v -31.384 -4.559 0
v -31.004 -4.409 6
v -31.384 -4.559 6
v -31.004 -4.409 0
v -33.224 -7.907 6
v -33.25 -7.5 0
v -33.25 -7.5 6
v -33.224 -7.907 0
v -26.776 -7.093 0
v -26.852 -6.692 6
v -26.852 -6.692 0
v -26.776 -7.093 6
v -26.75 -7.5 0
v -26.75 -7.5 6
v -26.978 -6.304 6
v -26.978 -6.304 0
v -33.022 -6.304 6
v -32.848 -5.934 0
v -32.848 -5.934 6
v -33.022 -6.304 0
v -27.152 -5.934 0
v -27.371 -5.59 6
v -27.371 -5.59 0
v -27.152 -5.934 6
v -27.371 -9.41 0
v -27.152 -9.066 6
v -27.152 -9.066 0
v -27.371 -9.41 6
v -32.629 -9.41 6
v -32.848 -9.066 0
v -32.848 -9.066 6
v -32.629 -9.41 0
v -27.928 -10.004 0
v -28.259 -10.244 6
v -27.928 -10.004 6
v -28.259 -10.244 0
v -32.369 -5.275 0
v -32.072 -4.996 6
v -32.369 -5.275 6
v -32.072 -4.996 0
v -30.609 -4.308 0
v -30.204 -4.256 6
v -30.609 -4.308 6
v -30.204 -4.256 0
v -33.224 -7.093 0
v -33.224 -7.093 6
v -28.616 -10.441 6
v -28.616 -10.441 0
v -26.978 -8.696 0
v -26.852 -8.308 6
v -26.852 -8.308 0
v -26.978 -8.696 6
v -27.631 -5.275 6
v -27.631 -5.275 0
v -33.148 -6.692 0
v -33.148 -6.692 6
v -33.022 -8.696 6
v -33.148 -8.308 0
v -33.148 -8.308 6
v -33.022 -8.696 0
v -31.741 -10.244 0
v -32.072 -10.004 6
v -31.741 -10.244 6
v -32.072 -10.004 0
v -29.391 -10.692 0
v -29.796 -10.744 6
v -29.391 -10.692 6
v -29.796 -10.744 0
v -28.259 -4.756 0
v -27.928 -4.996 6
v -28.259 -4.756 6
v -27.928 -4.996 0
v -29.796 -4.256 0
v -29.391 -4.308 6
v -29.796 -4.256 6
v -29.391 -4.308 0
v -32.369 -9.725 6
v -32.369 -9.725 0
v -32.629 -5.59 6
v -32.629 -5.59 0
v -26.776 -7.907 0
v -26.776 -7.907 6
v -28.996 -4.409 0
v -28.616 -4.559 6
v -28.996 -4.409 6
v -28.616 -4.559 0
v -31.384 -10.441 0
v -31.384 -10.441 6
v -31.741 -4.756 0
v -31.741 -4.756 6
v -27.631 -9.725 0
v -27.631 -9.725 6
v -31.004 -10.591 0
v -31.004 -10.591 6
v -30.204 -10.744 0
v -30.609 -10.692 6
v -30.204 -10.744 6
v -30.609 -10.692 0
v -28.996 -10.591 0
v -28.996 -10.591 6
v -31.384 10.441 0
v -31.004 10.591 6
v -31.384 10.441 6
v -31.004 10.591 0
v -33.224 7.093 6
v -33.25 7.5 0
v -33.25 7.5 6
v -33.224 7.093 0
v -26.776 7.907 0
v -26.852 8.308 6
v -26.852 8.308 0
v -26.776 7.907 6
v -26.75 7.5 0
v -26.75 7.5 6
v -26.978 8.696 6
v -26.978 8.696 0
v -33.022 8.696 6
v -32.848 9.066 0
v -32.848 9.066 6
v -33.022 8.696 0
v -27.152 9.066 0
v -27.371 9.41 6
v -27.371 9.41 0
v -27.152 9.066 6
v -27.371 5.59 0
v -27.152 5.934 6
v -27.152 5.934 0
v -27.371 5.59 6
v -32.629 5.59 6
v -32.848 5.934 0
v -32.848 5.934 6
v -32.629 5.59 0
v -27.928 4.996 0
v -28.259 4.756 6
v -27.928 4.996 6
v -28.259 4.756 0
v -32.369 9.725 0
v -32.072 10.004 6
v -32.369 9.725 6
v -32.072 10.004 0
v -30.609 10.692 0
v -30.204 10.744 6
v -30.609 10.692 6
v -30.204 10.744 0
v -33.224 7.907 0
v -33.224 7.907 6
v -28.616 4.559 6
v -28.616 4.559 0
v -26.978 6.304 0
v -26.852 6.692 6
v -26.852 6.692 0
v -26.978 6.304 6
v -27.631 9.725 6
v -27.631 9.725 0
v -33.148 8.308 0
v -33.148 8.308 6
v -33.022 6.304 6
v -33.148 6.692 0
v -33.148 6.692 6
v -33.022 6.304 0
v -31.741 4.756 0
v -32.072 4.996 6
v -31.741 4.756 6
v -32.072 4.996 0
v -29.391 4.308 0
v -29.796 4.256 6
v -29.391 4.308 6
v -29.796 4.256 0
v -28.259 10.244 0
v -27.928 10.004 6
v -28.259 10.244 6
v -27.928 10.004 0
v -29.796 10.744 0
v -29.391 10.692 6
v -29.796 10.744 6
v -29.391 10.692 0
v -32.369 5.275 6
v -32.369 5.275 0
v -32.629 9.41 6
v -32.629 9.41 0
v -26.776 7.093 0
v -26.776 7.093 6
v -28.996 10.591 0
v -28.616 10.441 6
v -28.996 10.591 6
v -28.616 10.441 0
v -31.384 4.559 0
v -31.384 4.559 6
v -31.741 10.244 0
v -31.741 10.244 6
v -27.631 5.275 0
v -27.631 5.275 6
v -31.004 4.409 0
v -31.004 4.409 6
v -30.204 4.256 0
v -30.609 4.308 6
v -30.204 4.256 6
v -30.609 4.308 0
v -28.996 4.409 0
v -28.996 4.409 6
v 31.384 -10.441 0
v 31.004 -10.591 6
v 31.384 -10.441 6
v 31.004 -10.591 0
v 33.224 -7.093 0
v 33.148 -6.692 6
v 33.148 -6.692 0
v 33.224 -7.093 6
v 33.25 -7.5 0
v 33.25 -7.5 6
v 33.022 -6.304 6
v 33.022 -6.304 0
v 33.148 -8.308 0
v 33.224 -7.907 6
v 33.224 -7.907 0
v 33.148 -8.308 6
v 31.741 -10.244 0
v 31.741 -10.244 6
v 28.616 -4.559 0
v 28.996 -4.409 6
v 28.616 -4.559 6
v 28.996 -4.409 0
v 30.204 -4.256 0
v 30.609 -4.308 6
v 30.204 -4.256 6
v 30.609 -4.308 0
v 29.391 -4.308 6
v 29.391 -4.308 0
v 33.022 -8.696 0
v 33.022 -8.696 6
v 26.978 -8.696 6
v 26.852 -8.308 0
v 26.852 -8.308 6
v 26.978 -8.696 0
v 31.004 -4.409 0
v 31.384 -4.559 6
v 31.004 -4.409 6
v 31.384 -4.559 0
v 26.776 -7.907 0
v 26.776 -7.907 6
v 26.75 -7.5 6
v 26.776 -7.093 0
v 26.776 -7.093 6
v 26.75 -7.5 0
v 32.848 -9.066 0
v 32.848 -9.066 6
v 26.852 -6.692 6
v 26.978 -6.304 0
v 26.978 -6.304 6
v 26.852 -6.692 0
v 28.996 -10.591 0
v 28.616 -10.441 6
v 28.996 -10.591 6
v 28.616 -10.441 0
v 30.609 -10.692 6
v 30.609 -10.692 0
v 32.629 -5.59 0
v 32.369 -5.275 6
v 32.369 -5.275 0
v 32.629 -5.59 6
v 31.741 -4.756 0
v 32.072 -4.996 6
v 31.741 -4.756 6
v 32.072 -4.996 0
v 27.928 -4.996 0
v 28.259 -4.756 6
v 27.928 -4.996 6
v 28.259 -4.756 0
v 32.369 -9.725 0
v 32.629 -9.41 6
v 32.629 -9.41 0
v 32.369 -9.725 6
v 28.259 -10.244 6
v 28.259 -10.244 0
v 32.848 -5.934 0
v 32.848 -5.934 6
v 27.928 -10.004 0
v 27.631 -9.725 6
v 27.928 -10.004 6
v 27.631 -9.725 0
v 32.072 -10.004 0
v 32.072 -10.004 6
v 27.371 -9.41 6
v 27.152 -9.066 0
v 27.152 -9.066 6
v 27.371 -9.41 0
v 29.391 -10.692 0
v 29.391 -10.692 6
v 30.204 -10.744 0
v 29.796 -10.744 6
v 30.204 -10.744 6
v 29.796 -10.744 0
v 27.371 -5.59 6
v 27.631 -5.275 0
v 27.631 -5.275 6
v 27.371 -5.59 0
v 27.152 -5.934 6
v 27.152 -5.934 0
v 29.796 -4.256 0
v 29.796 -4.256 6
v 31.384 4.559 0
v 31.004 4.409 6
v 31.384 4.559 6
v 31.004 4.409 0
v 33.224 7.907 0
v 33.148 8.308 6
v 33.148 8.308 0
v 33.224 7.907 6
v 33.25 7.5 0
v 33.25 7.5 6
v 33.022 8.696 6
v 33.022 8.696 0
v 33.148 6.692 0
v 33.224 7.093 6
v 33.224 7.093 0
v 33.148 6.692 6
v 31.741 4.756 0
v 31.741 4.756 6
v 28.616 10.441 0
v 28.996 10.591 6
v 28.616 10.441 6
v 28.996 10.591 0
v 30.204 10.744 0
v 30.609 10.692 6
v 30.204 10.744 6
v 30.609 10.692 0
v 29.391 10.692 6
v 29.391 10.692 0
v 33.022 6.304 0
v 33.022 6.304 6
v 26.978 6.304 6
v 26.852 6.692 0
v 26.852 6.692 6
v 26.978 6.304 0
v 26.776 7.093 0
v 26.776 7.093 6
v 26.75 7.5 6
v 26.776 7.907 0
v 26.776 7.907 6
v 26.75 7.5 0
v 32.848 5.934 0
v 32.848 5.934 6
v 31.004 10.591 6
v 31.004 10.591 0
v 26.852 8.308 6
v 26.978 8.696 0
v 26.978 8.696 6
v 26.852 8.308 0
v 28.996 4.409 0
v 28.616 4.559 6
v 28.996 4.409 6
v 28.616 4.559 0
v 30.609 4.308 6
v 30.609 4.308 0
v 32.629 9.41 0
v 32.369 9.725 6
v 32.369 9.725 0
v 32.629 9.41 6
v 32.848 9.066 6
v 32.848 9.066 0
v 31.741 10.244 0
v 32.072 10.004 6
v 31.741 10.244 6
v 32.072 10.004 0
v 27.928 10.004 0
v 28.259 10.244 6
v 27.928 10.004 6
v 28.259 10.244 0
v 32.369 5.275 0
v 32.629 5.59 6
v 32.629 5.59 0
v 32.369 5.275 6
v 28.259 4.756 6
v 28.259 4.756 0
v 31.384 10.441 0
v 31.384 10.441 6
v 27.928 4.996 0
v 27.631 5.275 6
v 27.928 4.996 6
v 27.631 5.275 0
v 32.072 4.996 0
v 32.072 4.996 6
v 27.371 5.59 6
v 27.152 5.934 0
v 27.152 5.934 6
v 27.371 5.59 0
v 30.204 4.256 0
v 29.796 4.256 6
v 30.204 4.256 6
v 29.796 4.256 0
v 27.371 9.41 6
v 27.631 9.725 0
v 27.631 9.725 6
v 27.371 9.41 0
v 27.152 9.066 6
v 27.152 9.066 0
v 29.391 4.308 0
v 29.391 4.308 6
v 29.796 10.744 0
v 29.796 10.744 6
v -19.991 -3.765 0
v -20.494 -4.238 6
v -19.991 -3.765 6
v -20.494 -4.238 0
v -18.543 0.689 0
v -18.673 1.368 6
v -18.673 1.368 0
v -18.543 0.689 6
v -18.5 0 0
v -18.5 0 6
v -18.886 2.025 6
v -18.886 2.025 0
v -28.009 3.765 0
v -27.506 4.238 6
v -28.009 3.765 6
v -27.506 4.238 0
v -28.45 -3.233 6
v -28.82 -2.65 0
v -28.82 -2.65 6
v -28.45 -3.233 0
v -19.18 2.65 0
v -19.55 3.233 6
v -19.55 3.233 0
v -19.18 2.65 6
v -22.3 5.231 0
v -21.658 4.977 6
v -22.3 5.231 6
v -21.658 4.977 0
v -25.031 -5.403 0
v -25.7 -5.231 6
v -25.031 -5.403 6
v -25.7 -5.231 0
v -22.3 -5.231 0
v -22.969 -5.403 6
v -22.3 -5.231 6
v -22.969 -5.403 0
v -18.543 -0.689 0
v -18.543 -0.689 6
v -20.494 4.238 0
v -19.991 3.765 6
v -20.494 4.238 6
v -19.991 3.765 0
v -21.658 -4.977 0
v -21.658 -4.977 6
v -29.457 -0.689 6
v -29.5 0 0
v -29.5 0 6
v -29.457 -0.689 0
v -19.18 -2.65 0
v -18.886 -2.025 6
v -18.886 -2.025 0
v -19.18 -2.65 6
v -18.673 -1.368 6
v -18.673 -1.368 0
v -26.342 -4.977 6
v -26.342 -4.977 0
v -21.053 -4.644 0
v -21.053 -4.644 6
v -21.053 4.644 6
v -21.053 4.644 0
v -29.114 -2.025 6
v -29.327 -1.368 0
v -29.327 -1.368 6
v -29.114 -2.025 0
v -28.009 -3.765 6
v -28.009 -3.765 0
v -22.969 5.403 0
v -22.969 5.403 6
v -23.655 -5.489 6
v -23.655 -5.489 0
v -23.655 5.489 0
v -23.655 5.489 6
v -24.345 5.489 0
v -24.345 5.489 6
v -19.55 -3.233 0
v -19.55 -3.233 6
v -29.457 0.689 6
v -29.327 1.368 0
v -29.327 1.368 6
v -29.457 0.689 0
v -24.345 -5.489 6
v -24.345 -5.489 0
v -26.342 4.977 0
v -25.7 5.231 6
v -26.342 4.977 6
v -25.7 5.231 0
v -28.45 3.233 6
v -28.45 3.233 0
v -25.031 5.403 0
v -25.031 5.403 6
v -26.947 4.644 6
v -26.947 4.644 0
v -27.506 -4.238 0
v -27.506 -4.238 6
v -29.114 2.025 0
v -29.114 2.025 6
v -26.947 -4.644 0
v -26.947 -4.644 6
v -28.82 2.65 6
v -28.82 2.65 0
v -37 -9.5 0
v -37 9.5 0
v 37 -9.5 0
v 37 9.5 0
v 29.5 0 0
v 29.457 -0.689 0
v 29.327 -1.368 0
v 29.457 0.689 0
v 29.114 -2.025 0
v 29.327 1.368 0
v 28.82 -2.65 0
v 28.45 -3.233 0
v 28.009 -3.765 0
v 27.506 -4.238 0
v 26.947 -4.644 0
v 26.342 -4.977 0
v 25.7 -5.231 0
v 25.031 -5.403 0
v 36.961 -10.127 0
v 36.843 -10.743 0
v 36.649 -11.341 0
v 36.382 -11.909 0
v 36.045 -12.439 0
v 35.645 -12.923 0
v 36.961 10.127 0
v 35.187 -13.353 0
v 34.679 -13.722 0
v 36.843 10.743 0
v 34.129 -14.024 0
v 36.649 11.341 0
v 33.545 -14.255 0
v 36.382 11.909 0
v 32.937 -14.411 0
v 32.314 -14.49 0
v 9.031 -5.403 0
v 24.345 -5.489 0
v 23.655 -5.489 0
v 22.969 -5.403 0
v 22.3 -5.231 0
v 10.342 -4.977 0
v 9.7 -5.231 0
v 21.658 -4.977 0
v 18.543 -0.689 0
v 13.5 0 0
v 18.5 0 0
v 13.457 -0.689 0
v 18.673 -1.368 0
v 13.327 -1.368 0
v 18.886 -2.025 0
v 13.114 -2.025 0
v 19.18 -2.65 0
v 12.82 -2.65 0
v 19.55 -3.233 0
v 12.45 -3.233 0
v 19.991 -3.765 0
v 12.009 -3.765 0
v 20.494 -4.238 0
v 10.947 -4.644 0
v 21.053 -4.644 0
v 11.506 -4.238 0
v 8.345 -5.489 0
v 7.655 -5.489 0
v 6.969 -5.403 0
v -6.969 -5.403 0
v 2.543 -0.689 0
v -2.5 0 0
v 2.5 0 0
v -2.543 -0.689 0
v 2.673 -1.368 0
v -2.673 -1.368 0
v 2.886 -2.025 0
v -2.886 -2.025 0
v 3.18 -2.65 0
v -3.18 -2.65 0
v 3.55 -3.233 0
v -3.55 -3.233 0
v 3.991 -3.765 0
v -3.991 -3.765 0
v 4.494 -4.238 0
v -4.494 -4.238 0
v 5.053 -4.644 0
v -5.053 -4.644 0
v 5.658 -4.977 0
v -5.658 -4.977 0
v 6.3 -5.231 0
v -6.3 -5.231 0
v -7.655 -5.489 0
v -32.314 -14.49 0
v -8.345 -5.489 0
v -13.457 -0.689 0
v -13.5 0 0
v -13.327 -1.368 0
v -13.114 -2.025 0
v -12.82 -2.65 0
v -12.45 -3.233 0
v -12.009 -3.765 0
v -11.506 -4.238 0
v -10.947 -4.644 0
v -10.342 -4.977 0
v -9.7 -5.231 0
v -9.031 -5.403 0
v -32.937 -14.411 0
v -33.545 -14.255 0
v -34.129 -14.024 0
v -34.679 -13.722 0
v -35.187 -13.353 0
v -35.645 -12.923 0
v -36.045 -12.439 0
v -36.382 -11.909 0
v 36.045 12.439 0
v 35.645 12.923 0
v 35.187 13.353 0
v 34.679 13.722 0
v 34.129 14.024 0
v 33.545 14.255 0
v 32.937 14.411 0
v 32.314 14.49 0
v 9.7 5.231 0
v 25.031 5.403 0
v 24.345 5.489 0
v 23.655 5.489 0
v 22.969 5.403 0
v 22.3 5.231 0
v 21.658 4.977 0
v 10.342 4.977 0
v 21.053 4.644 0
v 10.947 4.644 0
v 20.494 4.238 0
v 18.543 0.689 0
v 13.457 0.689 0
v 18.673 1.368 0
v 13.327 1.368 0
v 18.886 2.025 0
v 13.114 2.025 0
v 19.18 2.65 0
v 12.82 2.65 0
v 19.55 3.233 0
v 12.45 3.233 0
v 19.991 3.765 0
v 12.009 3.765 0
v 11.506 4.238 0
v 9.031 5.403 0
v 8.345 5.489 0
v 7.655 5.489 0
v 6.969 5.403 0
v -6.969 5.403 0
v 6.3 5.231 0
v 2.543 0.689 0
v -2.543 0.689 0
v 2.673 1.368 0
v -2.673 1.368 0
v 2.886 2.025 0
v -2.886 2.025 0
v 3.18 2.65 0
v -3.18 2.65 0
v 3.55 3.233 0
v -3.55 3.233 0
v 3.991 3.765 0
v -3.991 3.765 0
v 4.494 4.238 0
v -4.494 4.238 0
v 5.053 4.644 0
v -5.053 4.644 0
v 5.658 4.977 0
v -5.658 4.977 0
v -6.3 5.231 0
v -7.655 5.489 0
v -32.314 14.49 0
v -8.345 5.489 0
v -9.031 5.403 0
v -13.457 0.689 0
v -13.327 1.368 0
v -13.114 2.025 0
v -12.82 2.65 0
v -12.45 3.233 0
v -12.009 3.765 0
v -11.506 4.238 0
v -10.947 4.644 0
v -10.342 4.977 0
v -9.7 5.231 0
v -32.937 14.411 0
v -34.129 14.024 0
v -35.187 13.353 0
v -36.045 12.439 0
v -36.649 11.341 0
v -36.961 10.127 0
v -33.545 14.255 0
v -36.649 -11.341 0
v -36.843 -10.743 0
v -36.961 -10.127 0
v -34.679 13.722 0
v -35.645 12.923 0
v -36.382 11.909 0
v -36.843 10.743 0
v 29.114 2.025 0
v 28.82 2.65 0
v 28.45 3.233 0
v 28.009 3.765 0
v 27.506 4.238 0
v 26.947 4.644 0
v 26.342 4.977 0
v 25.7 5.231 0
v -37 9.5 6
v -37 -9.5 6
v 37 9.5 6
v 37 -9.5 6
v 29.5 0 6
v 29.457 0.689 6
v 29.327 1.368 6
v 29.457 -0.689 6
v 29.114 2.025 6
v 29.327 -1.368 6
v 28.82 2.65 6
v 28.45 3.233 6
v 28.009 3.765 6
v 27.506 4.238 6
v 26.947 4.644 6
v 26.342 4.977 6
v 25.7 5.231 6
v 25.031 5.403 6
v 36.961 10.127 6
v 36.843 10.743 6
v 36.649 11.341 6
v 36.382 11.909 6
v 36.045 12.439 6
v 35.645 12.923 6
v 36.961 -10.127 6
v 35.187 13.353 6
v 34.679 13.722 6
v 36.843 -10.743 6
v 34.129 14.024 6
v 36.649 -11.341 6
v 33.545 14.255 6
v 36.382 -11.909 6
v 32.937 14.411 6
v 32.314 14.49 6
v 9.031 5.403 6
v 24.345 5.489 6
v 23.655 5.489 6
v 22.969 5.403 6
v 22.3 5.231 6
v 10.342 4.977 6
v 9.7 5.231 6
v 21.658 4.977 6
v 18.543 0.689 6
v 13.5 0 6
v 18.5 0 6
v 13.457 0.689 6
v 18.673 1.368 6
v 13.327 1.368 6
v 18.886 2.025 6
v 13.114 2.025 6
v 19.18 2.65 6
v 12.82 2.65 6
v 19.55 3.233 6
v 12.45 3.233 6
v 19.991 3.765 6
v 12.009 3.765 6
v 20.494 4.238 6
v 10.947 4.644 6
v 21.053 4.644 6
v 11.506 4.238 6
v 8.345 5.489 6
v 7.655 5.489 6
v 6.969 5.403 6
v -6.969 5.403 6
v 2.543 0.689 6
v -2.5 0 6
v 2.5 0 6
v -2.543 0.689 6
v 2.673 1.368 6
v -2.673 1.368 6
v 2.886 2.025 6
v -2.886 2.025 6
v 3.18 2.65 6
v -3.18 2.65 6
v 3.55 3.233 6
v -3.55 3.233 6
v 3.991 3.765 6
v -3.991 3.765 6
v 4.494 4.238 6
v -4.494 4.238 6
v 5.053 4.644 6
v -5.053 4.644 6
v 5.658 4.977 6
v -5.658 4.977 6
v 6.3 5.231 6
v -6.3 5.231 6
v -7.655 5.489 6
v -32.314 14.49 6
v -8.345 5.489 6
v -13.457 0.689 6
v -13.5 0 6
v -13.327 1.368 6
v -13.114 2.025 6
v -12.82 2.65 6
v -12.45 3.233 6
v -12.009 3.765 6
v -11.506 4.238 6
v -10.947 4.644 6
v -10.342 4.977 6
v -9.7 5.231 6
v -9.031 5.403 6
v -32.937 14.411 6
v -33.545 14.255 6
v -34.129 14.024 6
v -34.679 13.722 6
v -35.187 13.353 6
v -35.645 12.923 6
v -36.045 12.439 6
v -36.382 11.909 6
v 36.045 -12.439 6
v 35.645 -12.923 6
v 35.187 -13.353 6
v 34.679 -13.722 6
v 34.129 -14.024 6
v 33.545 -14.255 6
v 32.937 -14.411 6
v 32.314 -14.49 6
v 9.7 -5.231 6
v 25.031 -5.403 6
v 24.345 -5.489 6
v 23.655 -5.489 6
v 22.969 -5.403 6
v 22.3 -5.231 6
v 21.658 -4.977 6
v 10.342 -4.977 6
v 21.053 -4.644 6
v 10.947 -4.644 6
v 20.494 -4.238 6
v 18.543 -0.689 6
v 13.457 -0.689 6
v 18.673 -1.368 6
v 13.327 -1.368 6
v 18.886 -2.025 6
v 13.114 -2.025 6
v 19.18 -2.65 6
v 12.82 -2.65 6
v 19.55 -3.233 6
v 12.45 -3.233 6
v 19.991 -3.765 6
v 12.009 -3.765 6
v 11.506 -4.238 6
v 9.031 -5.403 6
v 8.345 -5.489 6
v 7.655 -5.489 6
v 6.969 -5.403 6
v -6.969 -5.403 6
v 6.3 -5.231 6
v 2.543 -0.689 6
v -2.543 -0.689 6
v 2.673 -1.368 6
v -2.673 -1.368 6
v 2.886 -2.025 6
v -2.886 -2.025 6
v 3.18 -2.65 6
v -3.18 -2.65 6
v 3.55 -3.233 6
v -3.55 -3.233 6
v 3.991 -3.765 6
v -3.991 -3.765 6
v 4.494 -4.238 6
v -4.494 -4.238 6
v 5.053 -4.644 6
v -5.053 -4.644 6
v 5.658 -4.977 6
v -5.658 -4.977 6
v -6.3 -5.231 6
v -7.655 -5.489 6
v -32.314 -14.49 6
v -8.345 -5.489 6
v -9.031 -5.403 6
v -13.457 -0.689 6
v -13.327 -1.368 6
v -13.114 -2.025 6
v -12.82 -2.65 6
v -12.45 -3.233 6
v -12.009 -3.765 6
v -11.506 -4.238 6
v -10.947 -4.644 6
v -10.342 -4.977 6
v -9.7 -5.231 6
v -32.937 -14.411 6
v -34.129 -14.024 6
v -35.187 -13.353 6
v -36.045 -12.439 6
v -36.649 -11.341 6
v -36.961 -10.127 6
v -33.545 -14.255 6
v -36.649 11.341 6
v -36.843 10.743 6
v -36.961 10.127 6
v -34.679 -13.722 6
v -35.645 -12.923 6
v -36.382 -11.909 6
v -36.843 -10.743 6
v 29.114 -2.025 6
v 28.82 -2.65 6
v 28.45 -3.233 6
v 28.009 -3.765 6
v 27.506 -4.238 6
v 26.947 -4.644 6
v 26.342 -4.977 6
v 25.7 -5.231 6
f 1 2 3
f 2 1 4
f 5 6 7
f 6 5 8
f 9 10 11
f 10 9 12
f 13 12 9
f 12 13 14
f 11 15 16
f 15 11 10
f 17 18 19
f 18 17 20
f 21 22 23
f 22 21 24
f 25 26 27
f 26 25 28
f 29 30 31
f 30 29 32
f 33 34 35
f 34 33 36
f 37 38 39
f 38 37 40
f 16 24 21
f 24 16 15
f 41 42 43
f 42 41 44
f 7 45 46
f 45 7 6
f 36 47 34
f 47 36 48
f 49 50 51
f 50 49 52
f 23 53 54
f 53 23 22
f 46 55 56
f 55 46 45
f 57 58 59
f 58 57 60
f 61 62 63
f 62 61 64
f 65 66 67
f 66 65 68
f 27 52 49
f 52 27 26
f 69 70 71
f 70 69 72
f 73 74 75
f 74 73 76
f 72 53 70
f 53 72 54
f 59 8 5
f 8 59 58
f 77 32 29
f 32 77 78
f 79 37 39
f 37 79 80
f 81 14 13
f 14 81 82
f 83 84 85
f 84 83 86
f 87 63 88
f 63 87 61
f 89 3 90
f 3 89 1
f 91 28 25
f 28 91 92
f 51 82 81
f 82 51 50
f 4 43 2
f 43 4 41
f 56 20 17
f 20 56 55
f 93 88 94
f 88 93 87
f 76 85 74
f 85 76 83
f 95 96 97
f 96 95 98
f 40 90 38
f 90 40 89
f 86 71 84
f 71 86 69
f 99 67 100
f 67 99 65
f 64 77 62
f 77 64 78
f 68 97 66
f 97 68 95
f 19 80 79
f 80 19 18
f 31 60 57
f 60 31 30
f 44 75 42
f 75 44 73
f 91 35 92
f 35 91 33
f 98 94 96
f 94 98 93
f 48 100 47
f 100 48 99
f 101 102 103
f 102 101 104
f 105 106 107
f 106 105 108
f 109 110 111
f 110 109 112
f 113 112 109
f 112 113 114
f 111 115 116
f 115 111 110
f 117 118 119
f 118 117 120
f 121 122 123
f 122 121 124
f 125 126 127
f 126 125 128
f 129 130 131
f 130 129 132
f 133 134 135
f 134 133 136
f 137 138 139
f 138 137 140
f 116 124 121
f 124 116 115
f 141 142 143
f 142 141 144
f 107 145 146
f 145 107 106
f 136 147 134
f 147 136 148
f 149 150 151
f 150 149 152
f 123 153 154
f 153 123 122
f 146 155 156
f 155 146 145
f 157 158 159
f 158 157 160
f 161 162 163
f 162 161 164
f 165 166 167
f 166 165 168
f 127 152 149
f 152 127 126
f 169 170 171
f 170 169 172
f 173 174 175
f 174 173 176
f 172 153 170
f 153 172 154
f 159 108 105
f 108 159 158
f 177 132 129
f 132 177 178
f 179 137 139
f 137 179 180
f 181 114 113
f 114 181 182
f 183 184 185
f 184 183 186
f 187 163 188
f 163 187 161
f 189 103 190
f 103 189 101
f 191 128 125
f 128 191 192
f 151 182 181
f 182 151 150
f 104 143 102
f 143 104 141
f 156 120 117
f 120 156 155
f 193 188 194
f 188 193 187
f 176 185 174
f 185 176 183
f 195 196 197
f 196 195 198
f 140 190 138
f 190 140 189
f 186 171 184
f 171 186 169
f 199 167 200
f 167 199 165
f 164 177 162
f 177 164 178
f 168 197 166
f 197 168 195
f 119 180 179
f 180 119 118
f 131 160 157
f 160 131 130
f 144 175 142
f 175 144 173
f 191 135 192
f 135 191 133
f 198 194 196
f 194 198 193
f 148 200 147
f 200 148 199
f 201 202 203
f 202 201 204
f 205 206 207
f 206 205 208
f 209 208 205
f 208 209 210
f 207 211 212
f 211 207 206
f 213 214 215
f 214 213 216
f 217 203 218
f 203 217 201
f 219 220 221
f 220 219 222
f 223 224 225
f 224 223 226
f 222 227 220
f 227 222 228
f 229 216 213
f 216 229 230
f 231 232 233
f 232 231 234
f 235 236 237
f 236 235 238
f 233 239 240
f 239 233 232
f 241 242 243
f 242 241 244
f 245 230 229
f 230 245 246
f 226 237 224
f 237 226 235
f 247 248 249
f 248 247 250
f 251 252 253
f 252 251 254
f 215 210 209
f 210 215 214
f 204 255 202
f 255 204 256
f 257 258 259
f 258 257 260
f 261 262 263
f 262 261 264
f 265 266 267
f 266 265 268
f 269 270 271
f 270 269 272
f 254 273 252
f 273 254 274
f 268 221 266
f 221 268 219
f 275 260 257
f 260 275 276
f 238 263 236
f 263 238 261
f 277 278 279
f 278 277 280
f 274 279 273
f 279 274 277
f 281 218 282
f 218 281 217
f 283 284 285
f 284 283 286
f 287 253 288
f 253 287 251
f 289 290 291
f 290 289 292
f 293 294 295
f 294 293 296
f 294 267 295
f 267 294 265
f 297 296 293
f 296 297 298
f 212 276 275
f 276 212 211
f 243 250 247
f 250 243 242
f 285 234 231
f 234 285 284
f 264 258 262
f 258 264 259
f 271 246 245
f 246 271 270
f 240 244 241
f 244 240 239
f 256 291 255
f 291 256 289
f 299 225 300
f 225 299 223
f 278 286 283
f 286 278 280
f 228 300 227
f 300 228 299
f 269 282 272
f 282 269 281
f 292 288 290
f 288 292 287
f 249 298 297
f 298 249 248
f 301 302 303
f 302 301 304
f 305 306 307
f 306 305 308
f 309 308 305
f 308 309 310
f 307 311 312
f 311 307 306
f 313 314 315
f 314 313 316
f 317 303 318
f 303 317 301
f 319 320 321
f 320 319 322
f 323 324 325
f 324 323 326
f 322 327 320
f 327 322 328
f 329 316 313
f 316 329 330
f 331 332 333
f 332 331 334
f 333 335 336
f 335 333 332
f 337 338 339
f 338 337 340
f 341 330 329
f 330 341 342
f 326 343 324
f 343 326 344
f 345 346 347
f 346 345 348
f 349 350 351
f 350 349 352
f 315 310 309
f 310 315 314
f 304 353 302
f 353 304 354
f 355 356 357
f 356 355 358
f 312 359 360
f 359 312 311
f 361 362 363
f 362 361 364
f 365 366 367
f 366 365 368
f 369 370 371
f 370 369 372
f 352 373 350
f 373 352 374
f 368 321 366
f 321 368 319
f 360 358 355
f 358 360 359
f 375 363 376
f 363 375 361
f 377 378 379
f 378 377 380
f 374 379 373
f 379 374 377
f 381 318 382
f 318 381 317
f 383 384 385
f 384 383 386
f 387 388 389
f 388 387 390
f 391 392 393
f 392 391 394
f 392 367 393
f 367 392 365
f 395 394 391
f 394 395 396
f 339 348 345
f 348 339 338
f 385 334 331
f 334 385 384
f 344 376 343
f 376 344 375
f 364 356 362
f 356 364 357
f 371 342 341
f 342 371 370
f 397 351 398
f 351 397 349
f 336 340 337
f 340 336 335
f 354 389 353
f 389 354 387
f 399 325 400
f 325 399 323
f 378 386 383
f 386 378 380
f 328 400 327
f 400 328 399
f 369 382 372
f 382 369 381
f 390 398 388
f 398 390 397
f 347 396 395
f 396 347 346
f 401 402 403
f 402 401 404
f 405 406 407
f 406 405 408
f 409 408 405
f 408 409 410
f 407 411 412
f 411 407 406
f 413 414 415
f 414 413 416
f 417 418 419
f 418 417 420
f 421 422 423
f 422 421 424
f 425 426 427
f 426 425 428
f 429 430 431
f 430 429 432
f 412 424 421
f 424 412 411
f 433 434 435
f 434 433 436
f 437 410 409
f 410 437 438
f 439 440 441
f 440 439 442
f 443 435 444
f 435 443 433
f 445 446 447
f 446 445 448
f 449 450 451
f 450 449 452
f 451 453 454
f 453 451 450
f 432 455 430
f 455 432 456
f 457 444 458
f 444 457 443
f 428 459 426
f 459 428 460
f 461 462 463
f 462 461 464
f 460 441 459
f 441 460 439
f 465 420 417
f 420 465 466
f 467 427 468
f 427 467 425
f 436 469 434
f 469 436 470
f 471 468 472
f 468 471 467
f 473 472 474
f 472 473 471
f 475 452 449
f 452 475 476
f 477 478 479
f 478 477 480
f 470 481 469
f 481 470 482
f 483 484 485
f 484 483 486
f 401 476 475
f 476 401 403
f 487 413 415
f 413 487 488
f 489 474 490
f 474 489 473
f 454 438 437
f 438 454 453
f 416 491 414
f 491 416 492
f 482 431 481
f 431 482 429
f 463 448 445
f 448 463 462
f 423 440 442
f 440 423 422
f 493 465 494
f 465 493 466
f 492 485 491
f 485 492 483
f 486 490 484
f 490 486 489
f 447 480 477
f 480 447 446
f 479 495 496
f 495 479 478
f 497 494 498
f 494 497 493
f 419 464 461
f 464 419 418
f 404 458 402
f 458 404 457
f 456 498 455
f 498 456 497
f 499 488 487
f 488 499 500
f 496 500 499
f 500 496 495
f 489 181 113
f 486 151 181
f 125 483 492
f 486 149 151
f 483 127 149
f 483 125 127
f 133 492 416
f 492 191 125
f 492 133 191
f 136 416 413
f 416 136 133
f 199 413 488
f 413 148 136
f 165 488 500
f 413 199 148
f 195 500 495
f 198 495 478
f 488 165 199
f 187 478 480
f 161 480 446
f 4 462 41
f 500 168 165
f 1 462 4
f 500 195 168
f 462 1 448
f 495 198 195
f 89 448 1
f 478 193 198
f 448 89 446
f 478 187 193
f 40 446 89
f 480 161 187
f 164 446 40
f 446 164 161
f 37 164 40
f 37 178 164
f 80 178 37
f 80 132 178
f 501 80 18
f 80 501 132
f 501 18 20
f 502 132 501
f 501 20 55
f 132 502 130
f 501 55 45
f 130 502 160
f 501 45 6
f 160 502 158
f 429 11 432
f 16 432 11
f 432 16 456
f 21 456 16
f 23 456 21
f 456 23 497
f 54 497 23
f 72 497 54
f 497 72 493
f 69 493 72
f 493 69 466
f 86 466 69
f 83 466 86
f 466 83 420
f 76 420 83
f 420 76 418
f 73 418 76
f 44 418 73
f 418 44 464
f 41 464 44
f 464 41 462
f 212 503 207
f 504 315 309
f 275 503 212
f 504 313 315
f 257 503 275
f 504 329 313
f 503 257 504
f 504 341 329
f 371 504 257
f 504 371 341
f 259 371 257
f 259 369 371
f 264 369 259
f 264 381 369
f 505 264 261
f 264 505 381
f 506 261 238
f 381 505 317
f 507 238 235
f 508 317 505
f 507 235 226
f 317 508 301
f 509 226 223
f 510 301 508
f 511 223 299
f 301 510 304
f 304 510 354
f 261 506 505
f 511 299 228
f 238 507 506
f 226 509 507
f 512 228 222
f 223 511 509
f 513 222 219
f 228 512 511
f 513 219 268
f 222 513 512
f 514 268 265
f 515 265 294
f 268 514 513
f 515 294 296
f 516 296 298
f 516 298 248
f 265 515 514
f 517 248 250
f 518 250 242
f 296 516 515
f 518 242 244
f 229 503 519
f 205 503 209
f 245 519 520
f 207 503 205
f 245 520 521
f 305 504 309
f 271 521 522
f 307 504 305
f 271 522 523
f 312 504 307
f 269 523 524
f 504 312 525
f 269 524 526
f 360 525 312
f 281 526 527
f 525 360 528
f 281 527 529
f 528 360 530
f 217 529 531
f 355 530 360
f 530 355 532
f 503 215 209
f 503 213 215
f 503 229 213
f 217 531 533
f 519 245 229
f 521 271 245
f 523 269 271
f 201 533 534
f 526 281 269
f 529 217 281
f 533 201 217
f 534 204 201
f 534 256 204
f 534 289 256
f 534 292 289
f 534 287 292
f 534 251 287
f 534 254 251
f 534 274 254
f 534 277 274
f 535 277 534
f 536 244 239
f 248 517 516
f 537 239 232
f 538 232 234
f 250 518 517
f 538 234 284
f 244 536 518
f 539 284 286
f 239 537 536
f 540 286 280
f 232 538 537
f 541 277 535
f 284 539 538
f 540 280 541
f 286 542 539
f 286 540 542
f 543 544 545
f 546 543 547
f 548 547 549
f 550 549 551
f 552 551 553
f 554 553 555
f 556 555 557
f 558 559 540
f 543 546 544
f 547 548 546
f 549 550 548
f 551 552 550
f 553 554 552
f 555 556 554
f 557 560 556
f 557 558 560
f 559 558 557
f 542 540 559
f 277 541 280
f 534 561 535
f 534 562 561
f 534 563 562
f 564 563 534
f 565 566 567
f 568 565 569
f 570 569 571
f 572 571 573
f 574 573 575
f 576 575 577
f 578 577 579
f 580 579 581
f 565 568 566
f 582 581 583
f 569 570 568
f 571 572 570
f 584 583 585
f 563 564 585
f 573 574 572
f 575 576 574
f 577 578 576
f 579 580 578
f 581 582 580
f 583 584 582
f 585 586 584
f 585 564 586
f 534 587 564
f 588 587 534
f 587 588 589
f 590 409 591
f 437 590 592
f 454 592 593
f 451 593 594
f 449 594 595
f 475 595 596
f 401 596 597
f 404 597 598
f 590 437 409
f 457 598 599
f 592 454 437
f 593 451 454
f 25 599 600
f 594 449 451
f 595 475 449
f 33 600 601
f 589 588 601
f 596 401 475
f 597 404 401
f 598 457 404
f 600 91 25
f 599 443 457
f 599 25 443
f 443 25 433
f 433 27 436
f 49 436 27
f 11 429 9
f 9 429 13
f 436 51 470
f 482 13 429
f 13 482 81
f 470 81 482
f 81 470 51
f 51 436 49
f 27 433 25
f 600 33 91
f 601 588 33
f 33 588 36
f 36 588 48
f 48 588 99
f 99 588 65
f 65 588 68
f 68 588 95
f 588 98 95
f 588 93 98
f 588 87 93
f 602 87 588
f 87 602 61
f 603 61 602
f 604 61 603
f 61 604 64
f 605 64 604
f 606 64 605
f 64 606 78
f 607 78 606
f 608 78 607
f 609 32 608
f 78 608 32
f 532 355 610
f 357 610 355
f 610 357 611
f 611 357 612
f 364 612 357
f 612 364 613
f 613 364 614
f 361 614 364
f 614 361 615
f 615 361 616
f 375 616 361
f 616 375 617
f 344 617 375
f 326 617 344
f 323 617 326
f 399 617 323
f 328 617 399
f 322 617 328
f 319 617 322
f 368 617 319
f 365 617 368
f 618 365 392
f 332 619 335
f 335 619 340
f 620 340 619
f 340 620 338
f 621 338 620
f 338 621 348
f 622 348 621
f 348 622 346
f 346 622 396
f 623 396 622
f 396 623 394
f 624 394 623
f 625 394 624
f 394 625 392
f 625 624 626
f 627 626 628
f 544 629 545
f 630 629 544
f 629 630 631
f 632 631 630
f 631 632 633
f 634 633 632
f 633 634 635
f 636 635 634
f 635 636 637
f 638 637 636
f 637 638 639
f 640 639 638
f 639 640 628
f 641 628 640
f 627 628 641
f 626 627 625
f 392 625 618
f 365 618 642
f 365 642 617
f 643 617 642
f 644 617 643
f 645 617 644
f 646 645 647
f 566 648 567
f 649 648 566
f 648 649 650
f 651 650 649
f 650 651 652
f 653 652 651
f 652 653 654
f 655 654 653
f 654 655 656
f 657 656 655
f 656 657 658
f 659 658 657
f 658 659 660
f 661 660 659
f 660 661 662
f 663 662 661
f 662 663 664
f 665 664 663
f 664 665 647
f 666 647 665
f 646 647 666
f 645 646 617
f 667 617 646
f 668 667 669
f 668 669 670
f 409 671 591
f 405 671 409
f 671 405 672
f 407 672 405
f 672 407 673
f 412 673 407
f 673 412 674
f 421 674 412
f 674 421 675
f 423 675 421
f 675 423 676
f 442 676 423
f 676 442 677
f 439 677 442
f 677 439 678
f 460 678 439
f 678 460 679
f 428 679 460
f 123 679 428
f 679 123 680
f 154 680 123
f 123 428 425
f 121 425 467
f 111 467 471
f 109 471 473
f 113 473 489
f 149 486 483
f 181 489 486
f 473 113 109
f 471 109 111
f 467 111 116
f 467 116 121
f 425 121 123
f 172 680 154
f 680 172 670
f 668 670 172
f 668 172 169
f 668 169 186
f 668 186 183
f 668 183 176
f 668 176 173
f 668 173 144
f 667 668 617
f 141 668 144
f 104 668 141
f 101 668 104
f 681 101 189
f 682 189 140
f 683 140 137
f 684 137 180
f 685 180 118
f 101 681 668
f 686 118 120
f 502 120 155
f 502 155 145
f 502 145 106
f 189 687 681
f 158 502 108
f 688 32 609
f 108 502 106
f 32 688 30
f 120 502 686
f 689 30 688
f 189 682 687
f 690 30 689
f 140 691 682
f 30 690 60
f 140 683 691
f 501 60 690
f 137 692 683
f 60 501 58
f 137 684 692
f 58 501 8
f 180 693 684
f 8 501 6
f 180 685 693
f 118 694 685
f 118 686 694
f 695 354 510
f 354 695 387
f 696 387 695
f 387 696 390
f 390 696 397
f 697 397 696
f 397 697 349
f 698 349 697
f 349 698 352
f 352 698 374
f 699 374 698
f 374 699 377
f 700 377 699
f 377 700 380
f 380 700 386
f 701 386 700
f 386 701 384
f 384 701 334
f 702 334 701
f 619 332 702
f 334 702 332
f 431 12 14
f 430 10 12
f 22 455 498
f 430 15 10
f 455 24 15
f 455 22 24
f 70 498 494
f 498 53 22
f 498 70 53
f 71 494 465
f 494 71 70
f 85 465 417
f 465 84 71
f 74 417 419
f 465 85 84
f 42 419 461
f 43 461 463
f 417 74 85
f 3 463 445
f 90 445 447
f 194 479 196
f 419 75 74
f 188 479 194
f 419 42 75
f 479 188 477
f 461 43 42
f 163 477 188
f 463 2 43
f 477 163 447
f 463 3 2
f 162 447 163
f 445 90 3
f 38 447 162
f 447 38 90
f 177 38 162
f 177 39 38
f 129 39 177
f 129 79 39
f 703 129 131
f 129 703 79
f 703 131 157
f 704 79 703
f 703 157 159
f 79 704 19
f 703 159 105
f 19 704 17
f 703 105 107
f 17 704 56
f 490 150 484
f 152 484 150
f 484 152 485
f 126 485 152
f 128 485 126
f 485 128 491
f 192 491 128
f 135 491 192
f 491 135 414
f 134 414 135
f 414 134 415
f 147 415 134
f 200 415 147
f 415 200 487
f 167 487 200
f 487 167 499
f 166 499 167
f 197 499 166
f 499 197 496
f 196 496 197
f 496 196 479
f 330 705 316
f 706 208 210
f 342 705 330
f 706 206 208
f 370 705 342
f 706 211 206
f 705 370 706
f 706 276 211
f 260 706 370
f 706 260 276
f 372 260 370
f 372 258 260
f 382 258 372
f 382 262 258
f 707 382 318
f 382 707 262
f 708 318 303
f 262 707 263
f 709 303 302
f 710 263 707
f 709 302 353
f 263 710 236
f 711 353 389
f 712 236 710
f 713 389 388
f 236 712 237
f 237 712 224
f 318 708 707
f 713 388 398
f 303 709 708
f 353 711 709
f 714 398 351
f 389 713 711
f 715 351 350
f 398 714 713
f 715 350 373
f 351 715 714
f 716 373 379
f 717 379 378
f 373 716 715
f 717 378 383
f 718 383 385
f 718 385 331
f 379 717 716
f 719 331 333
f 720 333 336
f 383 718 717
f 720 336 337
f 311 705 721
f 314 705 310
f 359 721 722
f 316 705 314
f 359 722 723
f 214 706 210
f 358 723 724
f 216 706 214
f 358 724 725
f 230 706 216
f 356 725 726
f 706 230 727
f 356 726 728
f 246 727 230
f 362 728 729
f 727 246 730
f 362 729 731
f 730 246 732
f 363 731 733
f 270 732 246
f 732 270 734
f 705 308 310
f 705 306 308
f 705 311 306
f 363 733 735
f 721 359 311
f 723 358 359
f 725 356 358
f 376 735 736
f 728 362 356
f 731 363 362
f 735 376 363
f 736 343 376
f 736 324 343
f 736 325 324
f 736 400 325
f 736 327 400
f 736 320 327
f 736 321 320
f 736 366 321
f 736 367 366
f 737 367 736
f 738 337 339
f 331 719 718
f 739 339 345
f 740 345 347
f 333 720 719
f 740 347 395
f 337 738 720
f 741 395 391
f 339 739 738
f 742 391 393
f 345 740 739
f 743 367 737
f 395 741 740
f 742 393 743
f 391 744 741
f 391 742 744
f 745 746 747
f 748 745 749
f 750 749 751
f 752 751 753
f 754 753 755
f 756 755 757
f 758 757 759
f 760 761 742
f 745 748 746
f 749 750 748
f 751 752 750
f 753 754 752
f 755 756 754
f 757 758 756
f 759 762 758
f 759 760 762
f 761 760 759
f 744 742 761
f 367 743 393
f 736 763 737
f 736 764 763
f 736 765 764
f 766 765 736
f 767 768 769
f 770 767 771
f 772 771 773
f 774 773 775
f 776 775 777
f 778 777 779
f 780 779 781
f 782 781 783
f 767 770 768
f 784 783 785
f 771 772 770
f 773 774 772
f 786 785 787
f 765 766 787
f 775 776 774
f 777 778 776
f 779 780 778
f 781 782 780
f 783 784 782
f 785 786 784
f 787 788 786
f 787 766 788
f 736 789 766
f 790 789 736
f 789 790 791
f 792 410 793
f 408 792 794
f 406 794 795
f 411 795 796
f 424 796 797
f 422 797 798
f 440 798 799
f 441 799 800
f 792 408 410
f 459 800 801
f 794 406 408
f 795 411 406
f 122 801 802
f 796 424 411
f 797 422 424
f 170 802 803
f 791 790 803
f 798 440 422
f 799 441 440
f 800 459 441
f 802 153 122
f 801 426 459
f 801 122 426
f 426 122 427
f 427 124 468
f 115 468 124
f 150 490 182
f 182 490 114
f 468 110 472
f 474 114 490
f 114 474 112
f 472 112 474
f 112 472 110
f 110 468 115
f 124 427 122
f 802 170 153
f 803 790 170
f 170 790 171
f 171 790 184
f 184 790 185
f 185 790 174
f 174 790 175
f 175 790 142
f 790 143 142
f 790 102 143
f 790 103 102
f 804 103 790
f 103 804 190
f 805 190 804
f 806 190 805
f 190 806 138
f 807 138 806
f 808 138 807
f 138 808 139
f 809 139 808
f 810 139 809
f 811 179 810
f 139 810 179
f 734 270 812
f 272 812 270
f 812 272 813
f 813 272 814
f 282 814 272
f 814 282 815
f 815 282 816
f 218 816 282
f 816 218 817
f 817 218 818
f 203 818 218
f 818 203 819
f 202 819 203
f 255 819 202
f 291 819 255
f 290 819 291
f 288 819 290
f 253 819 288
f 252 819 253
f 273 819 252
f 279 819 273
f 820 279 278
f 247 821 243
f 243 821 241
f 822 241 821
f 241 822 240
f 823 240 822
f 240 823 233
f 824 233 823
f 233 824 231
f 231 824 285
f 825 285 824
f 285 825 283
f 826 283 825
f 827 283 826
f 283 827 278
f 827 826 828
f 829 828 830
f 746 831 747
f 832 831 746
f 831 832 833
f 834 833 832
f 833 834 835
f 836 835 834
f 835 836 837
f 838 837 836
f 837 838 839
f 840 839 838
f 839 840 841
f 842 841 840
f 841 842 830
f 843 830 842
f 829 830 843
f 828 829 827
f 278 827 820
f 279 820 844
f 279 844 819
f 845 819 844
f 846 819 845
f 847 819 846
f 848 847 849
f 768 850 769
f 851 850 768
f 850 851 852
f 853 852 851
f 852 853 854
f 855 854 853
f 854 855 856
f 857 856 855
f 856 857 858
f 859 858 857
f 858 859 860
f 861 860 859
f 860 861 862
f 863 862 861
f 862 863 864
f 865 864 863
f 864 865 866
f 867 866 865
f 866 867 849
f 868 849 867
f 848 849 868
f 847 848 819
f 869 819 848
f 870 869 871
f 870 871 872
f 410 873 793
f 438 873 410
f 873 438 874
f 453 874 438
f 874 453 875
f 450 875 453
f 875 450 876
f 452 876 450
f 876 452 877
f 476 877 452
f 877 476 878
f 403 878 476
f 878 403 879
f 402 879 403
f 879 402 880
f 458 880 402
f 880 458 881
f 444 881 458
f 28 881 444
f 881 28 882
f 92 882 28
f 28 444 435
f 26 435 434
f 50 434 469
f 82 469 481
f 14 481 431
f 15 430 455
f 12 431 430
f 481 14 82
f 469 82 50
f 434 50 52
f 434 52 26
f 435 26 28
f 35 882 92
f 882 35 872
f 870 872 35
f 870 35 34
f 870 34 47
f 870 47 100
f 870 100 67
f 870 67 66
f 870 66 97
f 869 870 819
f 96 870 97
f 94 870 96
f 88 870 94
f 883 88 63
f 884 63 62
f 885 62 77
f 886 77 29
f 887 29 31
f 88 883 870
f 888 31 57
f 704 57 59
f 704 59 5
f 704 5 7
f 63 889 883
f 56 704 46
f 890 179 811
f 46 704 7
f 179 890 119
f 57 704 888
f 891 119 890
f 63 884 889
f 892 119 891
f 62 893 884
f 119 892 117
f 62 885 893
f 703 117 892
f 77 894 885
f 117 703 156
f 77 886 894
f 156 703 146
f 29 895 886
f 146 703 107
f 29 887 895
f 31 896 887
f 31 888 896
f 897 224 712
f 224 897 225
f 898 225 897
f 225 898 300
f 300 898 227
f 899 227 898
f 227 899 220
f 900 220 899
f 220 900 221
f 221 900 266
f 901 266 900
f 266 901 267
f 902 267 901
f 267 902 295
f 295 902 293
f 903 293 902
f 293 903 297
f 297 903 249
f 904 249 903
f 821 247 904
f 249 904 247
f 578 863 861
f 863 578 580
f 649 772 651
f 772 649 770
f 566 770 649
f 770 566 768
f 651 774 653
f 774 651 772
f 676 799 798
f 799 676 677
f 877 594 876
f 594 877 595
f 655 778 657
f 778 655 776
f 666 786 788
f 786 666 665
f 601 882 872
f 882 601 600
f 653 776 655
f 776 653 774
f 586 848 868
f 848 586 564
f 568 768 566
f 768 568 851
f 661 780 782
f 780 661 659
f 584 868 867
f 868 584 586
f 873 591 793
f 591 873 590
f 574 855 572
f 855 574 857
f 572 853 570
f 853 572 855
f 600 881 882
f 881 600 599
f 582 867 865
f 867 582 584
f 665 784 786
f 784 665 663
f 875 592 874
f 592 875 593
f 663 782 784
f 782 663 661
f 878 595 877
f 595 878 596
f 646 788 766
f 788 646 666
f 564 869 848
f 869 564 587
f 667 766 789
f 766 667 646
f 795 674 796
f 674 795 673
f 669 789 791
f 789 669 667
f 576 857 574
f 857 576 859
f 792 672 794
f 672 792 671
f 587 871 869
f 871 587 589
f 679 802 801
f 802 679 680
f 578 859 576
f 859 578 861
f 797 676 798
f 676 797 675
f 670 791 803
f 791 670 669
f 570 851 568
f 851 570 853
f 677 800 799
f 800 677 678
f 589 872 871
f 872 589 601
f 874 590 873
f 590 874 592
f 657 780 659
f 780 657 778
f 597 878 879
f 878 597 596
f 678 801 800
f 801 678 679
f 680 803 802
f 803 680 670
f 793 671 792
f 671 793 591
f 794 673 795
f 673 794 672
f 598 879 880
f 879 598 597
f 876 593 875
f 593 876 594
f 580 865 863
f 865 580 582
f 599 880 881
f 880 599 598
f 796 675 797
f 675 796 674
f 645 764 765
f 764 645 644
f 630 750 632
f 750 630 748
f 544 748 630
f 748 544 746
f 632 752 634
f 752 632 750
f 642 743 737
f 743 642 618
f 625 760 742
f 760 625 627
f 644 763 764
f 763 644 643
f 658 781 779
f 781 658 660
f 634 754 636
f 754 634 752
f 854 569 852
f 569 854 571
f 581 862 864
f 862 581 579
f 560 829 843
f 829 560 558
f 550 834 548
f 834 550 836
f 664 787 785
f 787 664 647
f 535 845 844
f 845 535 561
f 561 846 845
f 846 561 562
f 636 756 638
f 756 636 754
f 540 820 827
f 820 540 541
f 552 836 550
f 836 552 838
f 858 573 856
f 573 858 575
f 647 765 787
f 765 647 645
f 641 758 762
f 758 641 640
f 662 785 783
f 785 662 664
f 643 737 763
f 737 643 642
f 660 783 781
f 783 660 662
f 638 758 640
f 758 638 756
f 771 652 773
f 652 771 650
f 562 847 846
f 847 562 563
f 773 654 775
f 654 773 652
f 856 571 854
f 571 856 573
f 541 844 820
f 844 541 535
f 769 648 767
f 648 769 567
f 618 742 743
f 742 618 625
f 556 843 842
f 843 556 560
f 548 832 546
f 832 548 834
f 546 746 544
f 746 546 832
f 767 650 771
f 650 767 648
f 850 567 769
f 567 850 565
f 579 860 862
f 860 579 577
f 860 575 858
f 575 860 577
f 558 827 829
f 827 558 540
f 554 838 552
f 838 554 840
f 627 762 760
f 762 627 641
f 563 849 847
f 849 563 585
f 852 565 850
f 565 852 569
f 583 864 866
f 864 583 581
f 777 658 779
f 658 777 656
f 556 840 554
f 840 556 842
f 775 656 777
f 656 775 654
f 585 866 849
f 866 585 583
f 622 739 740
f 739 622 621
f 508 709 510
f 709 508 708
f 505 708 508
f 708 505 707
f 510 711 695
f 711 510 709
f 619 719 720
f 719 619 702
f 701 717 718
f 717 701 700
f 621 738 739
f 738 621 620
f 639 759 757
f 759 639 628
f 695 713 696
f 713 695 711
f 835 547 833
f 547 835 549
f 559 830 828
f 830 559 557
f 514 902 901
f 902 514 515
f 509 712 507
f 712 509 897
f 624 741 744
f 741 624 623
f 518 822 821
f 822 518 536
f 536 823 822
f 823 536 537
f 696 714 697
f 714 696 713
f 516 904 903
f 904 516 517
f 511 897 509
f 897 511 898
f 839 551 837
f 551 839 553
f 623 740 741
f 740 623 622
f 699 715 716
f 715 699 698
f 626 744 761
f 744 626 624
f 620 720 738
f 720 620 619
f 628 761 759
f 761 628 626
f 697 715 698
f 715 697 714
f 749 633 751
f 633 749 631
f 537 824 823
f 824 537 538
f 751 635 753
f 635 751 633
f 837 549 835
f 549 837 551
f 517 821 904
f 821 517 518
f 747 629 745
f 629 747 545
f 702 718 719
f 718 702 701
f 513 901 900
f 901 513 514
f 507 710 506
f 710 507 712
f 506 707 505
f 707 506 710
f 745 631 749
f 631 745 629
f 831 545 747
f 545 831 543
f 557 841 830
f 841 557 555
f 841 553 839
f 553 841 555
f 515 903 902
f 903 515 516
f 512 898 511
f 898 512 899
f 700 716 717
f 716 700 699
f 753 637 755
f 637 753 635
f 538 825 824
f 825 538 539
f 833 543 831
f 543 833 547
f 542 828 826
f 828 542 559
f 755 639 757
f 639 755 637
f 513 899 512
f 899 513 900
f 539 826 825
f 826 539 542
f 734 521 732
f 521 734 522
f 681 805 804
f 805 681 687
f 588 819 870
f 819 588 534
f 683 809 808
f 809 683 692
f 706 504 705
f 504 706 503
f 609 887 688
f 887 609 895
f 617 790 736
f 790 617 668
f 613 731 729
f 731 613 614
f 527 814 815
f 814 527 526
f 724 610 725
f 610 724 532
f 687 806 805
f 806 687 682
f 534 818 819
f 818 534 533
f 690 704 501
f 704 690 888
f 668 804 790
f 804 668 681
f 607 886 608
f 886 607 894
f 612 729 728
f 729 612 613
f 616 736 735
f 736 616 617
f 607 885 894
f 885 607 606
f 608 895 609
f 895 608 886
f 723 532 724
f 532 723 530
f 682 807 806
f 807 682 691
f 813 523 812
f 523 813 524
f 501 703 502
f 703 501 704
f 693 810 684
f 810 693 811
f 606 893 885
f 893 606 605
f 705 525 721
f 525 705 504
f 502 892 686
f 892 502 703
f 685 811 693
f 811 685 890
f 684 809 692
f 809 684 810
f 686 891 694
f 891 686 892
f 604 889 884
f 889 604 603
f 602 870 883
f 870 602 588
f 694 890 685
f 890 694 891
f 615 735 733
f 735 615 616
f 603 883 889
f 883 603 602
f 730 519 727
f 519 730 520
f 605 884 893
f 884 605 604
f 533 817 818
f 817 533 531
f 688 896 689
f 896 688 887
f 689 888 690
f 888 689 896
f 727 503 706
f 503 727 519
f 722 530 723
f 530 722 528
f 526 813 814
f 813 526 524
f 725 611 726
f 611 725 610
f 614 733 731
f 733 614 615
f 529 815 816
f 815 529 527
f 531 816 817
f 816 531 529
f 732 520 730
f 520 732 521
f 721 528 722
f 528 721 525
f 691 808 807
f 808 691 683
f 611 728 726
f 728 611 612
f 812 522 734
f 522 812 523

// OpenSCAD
$fn = 50;


difference() {
	union() {
		hull() {
			translate(v = [-32.0000000000, 9.5000000000, 0]) {
				cylinder(h = 6, r = 5);
			}
			translate(v = [32.0000000000, 9.5000000000, 0]) {
				cylinder(h = 6, r = 5);
			}
			translate(v = [-32.0000000000, -9.5000000000, 0]) {
				cylinder(h = 6, r = 5);
			}
			translate(v = [32.0000000000, -9.5000000000, 0]) {
				cylinder(h = 6, r = 5);
			}
		}
	}
	union() {
		#translate(v = [-30.0000000000, -7.5000000000, -100.0000000000]) {
			cylinder(h = 200, r = 3.2500000000);
		}
		#translate(v = [-30.0000000000, 7.5000000000, -100.0000000000]) {
			cylinder(h = 200, r = 3.2500000000);
		}
		#translate(v = [30.0000000000, -7.5000000000, -100.0000000000]) {
			cylinder(h = 200, r = 3.2500000000);
		}
		#translate(v = [30.0000000000, 7.5000000000, -100.0000000000]) {
			cylinder(h = 200, r = 3.2500000000);
		}
		#translate(v = [-24.0000000000, 0, 0]) {
			cylinder(h = 6, r = 5.5000000000);
		}
		#translate(v = [-8.0000000000, 0, 0]) {
			cylinder(h = 6, r = 5.5000000000);
		}
		#translate(v = [8.0000000000, 0, 0]) {
			cylinder(h = 6, r = 5.5000000000);
		}
		#translate(v = [24.0000000000, 0, 0]) {
			cylinder(h = 6, r = 5.5000000000);
		}
	}
}
